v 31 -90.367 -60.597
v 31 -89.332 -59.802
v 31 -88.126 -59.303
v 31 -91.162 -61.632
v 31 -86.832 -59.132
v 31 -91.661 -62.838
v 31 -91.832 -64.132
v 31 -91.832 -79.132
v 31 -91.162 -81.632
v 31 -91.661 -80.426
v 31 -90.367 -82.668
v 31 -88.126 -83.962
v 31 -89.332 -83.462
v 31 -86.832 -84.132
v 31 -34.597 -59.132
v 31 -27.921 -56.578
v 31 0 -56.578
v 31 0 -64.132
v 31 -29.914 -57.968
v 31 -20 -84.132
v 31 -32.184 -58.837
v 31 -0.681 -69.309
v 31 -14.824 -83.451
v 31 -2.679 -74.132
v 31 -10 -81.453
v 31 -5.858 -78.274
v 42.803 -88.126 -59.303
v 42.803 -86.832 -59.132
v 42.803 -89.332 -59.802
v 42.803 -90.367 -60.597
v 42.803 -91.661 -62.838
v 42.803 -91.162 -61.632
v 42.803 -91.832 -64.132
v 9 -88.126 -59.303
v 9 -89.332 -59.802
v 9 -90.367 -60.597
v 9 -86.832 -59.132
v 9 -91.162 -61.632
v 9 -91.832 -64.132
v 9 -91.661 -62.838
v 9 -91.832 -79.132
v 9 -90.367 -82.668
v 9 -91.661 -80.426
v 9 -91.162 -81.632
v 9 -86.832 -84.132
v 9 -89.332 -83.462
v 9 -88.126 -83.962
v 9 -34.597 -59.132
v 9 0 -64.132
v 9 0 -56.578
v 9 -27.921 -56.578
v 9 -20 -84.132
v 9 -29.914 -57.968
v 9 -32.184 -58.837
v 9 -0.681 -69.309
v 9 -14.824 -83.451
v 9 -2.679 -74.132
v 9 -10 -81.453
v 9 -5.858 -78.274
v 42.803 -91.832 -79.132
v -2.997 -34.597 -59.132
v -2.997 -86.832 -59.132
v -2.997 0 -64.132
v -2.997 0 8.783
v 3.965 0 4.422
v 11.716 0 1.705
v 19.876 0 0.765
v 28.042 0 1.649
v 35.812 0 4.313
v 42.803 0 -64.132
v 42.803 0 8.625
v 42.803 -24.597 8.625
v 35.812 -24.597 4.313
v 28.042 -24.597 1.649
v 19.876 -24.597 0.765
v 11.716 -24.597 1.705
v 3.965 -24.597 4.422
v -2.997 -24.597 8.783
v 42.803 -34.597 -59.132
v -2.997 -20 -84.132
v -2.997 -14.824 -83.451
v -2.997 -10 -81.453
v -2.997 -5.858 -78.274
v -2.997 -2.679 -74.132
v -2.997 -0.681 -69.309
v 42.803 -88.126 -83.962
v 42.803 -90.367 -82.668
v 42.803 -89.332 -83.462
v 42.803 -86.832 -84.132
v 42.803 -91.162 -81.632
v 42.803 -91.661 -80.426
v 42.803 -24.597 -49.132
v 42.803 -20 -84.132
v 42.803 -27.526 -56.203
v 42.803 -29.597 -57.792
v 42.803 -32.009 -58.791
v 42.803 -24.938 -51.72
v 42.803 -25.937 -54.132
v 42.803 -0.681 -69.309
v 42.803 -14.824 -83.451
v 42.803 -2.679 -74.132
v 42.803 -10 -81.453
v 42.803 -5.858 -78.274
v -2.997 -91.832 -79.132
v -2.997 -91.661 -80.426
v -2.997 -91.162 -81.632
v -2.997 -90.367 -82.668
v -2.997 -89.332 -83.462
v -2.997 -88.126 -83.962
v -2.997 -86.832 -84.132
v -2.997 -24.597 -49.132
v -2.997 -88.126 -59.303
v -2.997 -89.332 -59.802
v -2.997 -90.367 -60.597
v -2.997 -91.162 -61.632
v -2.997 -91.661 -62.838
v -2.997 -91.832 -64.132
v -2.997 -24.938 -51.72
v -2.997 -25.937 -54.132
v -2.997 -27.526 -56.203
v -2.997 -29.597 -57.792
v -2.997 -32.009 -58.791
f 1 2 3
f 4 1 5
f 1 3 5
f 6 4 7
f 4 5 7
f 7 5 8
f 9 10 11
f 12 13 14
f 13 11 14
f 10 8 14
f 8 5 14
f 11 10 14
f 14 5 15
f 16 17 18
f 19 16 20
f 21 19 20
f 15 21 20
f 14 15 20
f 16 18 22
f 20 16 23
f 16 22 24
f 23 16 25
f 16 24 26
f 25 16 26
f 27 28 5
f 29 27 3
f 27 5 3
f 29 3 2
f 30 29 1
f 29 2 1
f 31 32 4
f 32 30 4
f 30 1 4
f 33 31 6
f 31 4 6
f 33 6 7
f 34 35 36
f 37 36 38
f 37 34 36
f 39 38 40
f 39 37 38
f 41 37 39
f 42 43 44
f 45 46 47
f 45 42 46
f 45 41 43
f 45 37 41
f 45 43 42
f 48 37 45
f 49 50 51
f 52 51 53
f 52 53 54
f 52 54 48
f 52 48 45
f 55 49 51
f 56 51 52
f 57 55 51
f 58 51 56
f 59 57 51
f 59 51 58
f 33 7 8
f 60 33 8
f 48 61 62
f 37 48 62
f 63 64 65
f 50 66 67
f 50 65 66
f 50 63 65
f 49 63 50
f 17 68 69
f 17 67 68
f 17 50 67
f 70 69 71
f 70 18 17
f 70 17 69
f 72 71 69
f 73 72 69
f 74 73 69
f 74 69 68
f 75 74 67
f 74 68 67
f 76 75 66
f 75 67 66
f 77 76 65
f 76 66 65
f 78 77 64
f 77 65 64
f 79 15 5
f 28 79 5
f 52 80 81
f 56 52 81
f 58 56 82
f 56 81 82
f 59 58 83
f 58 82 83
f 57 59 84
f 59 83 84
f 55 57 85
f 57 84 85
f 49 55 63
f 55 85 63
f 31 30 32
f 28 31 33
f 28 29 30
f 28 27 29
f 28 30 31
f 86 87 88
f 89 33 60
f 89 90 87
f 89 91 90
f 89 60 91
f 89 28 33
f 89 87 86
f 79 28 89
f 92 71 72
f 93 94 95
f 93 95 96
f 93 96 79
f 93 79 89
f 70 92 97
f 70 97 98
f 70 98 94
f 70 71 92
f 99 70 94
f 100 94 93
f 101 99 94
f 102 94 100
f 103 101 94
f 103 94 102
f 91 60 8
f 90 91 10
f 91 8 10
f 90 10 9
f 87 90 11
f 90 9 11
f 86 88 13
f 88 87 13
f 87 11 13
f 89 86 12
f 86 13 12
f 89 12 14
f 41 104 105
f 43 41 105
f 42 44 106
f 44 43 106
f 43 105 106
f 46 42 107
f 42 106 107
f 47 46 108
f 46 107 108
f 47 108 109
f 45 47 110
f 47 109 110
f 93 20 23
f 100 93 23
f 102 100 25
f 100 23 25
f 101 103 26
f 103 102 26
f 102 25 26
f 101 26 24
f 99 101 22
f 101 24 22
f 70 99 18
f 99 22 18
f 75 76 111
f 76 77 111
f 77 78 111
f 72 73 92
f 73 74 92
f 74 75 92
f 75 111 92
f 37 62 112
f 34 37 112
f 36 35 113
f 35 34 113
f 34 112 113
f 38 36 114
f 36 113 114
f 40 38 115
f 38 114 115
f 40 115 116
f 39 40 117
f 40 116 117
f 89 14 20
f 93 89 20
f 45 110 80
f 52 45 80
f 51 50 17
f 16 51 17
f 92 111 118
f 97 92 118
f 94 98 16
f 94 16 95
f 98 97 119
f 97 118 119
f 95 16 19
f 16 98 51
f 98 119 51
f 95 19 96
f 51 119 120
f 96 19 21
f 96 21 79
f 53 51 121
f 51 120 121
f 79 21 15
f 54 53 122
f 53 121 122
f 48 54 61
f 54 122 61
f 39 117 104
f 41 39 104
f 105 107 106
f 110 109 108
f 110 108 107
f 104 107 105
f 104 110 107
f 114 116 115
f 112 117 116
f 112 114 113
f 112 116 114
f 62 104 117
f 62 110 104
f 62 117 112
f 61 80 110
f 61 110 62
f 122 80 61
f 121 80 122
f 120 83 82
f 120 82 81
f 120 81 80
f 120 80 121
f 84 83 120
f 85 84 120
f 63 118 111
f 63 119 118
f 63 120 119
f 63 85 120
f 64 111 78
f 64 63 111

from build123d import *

# Parameters (mm, degrees)
EXTRUDE_START         = -3
EXTRUDE_1_DEPTH       = 46
SKETCH_2_W            = 22
SKETCH_2_H            = 41.003909118
CUT_EXTRUDE_2_DEPTH   = 115
SKETCH_4_W            = 74
SKETCH_4_H            = 24.59688775
EXTRUDE_3_DEPTH       = 55
CUT_EXTRUDE_2_2_DEPTH = 50
FILLET_2_R            = 4
SKETCH_7_R            = 3
CUT_EXTRUDE_3_DEPTH   = 90
FILLET_3_R            = 10
SKETCH_9_W            = 165.264464741
SKETCH_9_H            = 119.978910546
CUT_EXTRUDE_5_DEPTH   = 14.2
SKETCH_10_W           = 169.580693543
SKETCH_10_H           = 115.14513644
CUT_EXTRUDE_6_DEPTH   = 14


with BuildPart() as part:
    # Эскиз1 → Вытянуть1 (new body)
    with BuildSketch(Plane(origin=(0, 0, 0), x_dir=(0, 0, -1), z_dir=(1, 0, 0)).offset(EXTRUDE_START)):
        with BuildLine():
            Line((3.683652722, 0), (3.683652722, -24.59688775))
            Line((3.683652722, -24.59688775), (49.132150834, -24.59688775))
            ThreePointArc((49.132150834, -24.59688775), (56.203218646, -27.525819938), (59.132150834, -34.59688775))
            Line((59.132150834, -34.59688775), (59.132150834, -86.83159597))
            ThreePointArc((59.132150834, -86.83159597), (60.596616928, -90.367129876), (64.132150834, -91.83159597))
            Line((64.132150834, -91.83159597), (79.132150834, -91.83159597))
            ThreePointArc((79.132150834, -91.83159597), (82.66768474, -90.367129876), (84.132150834, -86.83159597))
            Line((84.132150834, -86.83159597), (84.132150834, -20))
            ThreePointArc((84.132150834, -20), (78.274286458, -5.857864376), (64.132150834, 0))
            Line((64.132150834, 0), (3.683652722, 0))
        make_face()
    extrude(amount=EXTRUDE_1_DEPTH)

    # Эскиз2 → Cut-Extrude 2 (cut, symmetric)
    with BuildSketch(Plane(origin=(0, 0, 0), x_dir=(1, 0, 0), z_dir=(0, 1, 0))):
        with Locations((20, 77.079487522)):
            Rectangle(SKETCH_2_W, SKETCH_2_H)
    extrude(amount=CUT_EXTRUDE_2_DEPTH, both=True, mode=Mode.SUBTRACT)

    # Эскиз4 → Вытянуть3 (add)
    with BuildSketch(Plane.XY.offset(-3.683652722)):
        with Locations((20.00338787, -12.298443875)):
            Rectangle(SKETCH_4_W, SKETCH_4_H)
    extrude(amount=EXTRUDE_3_DEPTH)

    # Эскиз6 → Cut-Extrude 2 2 (cut, symmetric)
    with BuildSketch(Plane(origin=(0, 0, 0), x_dir=(1, 0, 0), z_dir=(0, 1, 0))):
        with BuildLine():
            Line((47.00338787, -53.713591308), (47.00338787, -12.467045061))
            ThreePointArc((47.00338787, -12.467045061), (20.003387867, -0.765266351), (-6.99661213, -12.467045078))
            Line((-6.99661213, -12.467045078), (-6.99661213, -53.713591308))
            Line((-6.99661213, -53.713591308), (47.00338787, -53.713591308))
        make_face()
    extrude(amount=CUT_EXTRUDE_2_2_DEPTH, both=True, mode=Mode.SUBTRACT)

    # Скругление2
    fillet_2_edges = [part.edges().sort_by_distance(p)[0] for p in [
        (57.00338787, -12.298443875, -3.683652722),
        (-16.99661213, -12.298443875, -3.683652722),
    ]]
    fillet(fillet_2_edges, radius=FILLET_2_R)

    # Эскиз7 → Вырез-Вытянуть3 (cut, symmetric)
    with BuildSketch(Plane(origin=(57.00338787, 0, 0), x_dir=(0, 0, -1), z_dir=(1, 0, 0))):
        with Locations((-35.623538585, -11.460561108)):
            Circle(SKETCH_7_R)
    extrude(amount=CUT_EXTRUDE_3_DEPTH, both=True, mode=Mode.SUBTRACT)

    # Скругление3
    fillet_3_edges = [part.edges().sort_by_distance(p)[0] for p in [
        (-3, -12.298443875, -3.683652722),
        (43, -12.298443875, -3.683652722),
    ]]
    fillet(fillet_3_edges, radius=FILLET_3_R)

    # Эскиз9 → Вытянуть5 (cut)
    with BuildSketch(Plane(origin=(57.00338787, 0, 0), x_dir=(0, 0, -1), z_dir=(1, 0, 0))):
        with Locations((28.438864211, -53.728415023)):
            Rectangle(SKETCH_9_W, SKETCH_9_H)
    extrude(amount=-CUT_EXTRUDE_5_DEPTH, mode=Mode.SUBTRACT)

    # Эскиз10 → Вытянуть6 (cut)
    with BuildSketch(Plane.ZY.offset(16.99661213)):
        with Locations((-24.768184397, -40.528258671)):
            Rectangle(SKETCH_10_W, SKETCH_10_H)
    extrude(amount=-CUT_EXTRUDE_6_DEPTH, mode=Mode.SUBTRACT)


solid = part.part
